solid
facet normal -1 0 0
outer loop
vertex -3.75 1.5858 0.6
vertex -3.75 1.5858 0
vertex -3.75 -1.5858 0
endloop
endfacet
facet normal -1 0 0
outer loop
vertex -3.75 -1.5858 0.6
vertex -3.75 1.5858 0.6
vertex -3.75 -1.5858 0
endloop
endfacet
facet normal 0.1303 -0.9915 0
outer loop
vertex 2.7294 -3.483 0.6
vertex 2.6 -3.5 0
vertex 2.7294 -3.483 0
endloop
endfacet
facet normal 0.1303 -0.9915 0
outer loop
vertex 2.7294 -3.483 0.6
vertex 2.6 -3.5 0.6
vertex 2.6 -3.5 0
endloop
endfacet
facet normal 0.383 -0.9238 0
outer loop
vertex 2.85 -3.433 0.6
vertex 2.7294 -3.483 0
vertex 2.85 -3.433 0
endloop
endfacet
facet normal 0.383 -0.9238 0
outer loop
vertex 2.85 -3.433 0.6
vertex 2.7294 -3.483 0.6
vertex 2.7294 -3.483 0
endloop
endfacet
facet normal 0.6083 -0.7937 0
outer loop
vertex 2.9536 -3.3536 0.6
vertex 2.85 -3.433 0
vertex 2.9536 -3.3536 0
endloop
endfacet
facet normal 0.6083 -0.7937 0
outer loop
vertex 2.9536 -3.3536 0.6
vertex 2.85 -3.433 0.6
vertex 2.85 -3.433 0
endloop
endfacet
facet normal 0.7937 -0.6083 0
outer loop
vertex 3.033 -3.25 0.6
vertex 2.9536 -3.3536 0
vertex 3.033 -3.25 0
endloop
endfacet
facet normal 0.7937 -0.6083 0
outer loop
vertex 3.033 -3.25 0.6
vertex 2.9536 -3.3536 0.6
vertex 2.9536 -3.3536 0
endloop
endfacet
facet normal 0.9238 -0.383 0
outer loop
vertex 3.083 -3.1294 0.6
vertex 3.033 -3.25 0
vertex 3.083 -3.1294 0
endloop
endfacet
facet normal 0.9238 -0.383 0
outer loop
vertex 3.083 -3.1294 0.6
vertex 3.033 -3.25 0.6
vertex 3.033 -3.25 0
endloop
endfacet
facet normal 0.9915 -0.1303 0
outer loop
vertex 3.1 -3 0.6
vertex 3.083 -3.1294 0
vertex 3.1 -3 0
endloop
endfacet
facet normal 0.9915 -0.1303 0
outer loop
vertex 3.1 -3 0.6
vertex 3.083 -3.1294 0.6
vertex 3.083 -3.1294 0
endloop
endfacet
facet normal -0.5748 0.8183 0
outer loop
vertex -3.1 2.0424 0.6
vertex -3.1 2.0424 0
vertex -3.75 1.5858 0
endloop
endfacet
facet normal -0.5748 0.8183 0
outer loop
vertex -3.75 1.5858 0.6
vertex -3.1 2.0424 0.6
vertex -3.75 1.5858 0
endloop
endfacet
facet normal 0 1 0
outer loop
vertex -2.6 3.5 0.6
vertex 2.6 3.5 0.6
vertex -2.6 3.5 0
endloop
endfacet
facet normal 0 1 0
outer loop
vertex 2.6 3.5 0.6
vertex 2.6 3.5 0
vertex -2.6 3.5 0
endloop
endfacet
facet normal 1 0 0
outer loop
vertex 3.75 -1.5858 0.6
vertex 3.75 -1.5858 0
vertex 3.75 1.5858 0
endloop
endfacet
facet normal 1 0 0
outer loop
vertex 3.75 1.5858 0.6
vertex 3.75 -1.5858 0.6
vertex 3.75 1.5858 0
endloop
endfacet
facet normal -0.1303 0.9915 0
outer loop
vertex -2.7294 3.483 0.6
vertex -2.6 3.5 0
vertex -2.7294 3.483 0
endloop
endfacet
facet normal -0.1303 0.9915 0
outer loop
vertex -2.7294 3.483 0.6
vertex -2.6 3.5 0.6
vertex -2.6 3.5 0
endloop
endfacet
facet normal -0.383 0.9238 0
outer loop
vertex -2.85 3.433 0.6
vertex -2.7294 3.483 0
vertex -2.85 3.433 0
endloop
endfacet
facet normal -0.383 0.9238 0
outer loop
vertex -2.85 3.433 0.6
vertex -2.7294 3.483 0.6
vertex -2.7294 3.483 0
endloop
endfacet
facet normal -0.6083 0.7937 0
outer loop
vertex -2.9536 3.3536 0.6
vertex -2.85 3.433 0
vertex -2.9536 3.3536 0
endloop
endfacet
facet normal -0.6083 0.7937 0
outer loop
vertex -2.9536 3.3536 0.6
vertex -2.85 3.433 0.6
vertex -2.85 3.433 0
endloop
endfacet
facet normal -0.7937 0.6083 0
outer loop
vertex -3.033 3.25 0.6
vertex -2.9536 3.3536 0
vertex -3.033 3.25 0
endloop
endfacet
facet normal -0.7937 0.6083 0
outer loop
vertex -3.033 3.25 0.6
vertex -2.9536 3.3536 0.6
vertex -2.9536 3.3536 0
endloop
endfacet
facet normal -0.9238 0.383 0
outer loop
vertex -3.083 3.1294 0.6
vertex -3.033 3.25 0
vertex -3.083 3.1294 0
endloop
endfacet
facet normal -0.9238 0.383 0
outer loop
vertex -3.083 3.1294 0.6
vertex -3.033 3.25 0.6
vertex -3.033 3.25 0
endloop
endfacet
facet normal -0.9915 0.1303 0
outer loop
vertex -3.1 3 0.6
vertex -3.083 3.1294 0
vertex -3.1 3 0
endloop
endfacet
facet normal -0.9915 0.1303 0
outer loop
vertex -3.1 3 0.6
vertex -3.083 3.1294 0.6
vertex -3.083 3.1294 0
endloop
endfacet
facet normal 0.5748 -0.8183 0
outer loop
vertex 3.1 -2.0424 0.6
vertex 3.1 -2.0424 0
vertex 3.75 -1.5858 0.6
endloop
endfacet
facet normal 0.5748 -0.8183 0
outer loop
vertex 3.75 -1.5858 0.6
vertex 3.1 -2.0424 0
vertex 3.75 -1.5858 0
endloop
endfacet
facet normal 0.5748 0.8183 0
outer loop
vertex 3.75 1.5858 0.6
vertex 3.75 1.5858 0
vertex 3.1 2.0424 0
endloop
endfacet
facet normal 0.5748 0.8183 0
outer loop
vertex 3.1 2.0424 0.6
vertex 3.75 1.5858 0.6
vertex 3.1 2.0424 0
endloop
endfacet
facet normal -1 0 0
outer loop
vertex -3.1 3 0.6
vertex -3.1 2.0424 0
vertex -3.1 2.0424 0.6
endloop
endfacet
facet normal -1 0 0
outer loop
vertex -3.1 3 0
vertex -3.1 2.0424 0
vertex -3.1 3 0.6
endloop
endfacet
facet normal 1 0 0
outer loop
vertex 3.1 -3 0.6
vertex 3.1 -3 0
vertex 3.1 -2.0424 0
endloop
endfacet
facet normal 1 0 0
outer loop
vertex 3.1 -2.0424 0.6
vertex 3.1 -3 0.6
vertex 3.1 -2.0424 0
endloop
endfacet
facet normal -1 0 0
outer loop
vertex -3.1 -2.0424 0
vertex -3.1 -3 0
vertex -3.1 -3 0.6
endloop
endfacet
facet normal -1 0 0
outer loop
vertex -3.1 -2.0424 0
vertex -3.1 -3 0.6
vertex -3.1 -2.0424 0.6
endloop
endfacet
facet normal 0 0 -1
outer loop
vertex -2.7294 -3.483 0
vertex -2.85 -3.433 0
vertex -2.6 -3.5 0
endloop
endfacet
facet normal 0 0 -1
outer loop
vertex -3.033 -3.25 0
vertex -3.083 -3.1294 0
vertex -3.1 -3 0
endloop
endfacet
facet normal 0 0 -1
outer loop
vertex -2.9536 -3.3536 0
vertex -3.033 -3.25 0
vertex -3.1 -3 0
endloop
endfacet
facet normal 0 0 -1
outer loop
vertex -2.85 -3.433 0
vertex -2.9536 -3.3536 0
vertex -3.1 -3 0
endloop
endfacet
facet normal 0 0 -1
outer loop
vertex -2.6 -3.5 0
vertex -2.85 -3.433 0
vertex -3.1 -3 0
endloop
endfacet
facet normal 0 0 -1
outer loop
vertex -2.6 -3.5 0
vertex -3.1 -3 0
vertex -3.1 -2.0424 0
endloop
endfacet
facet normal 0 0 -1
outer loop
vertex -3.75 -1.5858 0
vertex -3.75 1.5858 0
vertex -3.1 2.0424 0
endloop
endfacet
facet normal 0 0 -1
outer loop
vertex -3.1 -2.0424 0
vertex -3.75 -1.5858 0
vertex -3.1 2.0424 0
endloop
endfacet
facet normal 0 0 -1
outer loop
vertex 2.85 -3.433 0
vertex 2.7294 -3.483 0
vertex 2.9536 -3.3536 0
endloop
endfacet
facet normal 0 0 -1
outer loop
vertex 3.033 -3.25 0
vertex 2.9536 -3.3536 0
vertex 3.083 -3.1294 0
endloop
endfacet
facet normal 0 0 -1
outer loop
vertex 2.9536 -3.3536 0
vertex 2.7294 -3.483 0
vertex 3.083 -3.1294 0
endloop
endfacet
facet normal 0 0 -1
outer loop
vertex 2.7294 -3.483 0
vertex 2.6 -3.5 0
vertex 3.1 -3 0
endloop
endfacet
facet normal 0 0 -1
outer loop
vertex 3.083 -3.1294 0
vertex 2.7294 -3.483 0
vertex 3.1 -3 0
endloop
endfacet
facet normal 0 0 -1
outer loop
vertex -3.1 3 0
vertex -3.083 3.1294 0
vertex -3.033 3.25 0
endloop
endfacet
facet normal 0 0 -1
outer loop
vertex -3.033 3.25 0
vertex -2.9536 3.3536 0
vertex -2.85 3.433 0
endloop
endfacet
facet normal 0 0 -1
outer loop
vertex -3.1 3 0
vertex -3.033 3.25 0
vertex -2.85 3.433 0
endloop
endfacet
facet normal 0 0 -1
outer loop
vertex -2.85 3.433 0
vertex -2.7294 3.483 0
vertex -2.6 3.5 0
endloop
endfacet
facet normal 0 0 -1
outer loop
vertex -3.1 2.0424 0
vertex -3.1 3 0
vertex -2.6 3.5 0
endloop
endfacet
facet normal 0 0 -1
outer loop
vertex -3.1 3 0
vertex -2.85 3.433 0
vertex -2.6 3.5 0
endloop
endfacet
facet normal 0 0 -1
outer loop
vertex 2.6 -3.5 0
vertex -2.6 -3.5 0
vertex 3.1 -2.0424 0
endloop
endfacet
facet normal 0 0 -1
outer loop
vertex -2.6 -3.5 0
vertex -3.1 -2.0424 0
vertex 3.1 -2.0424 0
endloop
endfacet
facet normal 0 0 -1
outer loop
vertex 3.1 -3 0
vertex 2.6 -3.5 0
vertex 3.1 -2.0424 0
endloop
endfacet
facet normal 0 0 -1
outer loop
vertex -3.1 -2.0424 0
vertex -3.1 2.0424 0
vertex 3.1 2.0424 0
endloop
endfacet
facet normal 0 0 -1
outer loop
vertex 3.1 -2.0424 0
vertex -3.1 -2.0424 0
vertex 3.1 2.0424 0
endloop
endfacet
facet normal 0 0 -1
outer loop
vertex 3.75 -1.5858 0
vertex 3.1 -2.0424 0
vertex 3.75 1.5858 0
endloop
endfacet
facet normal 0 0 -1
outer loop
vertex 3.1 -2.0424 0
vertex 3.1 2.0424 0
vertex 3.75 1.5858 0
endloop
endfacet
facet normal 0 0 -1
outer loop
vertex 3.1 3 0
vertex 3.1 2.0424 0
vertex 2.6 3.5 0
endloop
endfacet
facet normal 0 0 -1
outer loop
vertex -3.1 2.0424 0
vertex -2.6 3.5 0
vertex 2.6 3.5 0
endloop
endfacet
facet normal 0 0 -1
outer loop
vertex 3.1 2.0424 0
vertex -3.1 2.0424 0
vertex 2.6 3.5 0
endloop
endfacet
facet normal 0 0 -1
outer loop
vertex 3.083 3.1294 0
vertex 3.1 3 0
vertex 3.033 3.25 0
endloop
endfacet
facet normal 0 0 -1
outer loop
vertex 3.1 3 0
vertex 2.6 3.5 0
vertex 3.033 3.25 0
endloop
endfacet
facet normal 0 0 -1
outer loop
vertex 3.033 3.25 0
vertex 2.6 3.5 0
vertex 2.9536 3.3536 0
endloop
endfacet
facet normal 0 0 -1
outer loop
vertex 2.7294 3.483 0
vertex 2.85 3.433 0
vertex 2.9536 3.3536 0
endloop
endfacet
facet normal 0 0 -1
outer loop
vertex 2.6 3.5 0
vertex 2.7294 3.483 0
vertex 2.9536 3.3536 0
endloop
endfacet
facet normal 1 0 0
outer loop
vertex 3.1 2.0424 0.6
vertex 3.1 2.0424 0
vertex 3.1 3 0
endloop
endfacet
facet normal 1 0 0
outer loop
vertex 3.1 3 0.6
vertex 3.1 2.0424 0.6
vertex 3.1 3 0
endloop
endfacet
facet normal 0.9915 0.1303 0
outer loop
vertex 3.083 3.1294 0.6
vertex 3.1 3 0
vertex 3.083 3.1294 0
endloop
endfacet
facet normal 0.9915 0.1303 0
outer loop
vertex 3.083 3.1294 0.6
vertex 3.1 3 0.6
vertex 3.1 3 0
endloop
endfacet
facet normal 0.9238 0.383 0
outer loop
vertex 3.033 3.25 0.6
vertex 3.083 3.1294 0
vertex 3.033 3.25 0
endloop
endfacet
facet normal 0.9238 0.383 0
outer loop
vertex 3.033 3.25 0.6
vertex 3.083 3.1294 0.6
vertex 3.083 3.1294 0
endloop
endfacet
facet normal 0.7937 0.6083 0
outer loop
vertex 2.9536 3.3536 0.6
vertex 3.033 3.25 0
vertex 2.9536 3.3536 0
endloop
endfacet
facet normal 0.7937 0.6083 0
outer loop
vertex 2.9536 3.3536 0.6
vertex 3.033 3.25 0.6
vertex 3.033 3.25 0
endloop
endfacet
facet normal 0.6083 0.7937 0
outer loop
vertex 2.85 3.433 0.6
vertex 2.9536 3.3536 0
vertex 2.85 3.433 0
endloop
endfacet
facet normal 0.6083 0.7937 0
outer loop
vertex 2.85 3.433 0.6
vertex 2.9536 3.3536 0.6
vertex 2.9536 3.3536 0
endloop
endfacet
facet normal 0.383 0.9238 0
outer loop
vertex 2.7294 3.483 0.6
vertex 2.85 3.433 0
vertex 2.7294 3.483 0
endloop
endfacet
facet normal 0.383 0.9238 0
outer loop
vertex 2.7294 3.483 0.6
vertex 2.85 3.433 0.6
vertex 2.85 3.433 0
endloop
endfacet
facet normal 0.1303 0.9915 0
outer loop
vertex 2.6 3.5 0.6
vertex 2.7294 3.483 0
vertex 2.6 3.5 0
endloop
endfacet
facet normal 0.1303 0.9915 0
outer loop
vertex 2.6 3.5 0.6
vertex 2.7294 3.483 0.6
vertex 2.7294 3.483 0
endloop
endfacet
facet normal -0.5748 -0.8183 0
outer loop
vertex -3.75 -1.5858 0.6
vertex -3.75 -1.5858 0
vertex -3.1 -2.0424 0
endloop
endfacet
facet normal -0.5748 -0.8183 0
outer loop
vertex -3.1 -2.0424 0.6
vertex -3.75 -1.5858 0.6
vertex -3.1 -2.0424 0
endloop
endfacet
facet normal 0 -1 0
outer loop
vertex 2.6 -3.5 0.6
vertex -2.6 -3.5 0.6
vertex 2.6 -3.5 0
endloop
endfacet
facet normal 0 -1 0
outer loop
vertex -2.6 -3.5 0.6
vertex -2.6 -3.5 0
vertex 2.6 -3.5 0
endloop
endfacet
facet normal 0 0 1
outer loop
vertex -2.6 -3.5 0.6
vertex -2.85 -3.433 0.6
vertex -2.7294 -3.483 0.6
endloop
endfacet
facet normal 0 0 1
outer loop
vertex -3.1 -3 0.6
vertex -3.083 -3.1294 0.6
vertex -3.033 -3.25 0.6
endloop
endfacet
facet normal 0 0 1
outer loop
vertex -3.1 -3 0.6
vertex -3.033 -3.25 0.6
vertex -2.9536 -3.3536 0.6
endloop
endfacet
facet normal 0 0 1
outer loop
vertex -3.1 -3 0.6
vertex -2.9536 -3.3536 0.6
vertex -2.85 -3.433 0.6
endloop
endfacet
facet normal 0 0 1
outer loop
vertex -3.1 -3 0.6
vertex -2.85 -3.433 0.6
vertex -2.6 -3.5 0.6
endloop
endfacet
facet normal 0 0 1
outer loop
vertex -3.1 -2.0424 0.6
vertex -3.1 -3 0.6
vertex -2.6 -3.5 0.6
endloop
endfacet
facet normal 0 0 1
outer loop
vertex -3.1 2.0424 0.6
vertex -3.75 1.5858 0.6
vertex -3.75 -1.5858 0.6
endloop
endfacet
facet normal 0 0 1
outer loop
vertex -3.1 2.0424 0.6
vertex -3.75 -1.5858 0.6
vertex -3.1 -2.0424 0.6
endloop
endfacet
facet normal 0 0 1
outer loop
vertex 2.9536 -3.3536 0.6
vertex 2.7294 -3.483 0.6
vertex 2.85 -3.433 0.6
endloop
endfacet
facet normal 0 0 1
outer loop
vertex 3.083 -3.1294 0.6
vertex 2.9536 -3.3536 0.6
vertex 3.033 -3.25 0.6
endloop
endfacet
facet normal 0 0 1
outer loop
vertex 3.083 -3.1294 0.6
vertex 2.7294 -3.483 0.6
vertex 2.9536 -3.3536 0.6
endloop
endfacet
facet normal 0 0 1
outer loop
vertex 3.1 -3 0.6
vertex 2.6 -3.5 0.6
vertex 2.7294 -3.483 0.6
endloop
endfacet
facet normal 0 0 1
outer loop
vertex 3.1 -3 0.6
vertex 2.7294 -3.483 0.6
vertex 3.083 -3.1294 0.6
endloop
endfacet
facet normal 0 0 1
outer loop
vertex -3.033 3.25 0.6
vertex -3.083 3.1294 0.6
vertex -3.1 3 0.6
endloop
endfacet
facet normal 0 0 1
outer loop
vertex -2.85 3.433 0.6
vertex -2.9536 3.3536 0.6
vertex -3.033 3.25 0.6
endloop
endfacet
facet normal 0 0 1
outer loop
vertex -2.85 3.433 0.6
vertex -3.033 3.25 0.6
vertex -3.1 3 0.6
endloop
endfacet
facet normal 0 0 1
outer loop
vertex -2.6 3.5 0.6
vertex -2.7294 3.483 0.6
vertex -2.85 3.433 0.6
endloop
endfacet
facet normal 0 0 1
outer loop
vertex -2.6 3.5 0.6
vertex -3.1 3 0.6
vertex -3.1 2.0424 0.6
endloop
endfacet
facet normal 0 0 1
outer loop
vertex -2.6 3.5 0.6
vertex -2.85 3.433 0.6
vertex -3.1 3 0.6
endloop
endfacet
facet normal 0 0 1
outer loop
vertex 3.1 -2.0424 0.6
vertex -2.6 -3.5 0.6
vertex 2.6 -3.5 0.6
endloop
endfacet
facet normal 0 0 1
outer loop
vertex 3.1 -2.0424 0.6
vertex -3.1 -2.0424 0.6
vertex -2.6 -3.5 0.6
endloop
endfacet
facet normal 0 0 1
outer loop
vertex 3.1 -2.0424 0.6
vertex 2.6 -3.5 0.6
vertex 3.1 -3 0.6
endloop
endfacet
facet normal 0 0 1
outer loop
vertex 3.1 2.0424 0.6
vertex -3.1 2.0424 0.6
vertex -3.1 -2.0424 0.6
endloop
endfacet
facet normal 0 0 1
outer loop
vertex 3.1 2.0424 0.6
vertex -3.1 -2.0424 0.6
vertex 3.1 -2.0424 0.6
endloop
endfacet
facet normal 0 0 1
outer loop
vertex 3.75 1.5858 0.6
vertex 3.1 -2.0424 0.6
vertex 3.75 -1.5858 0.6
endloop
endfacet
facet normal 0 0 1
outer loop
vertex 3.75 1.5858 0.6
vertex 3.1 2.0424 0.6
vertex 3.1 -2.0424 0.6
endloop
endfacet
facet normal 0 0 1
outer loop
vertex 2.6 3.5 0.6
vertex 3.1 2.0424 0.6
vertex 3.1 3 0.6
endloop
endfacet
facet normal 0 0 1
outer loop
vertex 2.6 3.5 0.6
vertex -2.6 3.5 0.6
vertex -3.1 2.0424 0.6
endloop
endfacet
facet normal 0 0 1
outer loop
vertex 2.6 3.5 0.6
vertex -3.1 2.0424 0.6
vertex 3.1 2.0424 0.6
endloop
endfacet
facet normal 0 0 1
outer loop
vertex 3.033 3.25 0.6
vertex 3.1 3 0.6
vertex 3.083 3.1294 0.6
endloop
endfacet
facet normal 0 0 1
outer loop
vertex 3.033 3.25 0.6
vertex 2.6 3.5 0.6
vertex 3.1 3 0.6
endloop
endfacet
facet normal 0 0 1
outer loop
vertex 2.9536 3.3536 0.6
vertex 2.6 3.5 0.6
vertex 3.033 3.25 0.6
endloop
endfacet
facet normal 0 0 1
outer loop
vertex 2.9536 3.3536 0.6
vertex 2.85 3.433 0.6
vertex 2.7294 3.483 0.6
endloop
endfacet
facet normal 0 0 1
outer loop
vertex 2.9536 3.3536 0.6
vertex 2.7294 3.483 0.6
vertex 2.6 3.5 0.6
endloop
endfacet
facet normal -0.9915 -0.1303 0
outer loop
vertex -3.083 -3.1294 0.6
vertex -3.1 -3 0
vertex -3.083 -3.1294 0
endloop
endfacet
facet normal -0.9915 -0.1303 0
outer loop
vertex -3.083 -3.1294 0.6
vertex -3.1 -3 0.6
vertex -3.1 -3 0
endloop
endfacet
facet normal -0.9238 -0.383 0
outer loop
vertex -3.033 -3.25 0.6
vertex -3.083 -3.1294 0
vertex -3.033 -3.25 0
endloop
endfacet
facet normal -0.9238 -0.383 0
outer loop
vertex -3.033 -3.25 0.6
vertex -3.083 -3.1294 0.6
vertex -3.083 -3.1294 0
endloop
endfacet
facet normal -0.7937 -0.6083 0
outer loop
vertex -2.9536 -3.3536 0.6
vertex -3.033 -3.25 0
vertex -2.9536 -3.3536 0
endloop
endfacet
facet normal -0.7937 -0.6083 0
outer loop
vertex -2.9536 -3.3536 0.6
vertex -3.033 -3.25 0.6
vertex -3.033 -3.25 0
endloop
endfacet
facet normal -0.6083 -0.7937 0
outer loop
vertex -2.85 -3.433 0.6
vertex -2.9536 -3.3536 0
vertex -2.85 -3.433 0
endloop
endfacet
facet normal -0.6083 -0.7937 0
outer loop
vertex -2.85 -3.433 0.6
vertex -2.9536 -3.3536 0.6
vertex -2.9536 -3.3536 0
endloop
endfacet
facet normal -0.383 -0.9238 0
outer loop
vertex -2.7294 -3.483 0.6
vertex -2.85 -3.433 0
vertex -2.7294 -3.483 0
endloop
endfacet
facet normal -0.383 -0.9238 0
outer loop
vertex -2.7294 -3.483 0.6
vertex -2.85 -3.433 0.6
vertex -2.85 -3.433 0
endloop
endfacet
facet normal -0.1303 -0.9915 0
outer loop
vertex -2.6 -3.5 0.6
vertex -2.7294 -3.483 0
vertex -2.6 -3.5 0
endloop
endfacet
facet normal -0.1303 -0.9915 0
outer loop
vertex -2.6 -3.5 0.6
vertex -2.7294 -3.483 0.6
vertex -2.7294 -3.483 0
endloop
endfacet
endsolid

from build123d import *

# Parameters (mm, degrees)
F0_W     = 6.2
F0_H     = 7
F2_DEPTH = 0.6
F4_R     = 0.5


with BuildPart() as f2:
    # F1 (on Top) + F0 (on Top) → F2 (new body)
    with BuildSketch(Plane.XY):
        Polygon((1.025447, 3.5), (0, 3.5), (-1.025447, 3.5), (-3.75, 1.585766), (-3.75, 0), (-3.75, -1.585766), (-1.025447, -3.5), (0, -3.5), (1.025447, -3.5), (3.75, -1.585766), (3.75, 0), (3.75, 1.585766), align=None)
    with BuildSketch(Plane.XY):
        Rectangle(F0_W, F0_H)
    extrude(amount=F2_DEPTH)

    # F3: union 

    # F4
    f4_edges = [f2.edges().sort_by_distance(p)[0] for p in [
        (-3.1, 3.5, 0.3),
        (-3.1, -3.5, 0.3),
        (3.1, -3.5, 0.3),
        (3.1, 3.5, 0.3),
    ]]
    fillet(f4_edges, radius=F4_R)


solid = f2.part
